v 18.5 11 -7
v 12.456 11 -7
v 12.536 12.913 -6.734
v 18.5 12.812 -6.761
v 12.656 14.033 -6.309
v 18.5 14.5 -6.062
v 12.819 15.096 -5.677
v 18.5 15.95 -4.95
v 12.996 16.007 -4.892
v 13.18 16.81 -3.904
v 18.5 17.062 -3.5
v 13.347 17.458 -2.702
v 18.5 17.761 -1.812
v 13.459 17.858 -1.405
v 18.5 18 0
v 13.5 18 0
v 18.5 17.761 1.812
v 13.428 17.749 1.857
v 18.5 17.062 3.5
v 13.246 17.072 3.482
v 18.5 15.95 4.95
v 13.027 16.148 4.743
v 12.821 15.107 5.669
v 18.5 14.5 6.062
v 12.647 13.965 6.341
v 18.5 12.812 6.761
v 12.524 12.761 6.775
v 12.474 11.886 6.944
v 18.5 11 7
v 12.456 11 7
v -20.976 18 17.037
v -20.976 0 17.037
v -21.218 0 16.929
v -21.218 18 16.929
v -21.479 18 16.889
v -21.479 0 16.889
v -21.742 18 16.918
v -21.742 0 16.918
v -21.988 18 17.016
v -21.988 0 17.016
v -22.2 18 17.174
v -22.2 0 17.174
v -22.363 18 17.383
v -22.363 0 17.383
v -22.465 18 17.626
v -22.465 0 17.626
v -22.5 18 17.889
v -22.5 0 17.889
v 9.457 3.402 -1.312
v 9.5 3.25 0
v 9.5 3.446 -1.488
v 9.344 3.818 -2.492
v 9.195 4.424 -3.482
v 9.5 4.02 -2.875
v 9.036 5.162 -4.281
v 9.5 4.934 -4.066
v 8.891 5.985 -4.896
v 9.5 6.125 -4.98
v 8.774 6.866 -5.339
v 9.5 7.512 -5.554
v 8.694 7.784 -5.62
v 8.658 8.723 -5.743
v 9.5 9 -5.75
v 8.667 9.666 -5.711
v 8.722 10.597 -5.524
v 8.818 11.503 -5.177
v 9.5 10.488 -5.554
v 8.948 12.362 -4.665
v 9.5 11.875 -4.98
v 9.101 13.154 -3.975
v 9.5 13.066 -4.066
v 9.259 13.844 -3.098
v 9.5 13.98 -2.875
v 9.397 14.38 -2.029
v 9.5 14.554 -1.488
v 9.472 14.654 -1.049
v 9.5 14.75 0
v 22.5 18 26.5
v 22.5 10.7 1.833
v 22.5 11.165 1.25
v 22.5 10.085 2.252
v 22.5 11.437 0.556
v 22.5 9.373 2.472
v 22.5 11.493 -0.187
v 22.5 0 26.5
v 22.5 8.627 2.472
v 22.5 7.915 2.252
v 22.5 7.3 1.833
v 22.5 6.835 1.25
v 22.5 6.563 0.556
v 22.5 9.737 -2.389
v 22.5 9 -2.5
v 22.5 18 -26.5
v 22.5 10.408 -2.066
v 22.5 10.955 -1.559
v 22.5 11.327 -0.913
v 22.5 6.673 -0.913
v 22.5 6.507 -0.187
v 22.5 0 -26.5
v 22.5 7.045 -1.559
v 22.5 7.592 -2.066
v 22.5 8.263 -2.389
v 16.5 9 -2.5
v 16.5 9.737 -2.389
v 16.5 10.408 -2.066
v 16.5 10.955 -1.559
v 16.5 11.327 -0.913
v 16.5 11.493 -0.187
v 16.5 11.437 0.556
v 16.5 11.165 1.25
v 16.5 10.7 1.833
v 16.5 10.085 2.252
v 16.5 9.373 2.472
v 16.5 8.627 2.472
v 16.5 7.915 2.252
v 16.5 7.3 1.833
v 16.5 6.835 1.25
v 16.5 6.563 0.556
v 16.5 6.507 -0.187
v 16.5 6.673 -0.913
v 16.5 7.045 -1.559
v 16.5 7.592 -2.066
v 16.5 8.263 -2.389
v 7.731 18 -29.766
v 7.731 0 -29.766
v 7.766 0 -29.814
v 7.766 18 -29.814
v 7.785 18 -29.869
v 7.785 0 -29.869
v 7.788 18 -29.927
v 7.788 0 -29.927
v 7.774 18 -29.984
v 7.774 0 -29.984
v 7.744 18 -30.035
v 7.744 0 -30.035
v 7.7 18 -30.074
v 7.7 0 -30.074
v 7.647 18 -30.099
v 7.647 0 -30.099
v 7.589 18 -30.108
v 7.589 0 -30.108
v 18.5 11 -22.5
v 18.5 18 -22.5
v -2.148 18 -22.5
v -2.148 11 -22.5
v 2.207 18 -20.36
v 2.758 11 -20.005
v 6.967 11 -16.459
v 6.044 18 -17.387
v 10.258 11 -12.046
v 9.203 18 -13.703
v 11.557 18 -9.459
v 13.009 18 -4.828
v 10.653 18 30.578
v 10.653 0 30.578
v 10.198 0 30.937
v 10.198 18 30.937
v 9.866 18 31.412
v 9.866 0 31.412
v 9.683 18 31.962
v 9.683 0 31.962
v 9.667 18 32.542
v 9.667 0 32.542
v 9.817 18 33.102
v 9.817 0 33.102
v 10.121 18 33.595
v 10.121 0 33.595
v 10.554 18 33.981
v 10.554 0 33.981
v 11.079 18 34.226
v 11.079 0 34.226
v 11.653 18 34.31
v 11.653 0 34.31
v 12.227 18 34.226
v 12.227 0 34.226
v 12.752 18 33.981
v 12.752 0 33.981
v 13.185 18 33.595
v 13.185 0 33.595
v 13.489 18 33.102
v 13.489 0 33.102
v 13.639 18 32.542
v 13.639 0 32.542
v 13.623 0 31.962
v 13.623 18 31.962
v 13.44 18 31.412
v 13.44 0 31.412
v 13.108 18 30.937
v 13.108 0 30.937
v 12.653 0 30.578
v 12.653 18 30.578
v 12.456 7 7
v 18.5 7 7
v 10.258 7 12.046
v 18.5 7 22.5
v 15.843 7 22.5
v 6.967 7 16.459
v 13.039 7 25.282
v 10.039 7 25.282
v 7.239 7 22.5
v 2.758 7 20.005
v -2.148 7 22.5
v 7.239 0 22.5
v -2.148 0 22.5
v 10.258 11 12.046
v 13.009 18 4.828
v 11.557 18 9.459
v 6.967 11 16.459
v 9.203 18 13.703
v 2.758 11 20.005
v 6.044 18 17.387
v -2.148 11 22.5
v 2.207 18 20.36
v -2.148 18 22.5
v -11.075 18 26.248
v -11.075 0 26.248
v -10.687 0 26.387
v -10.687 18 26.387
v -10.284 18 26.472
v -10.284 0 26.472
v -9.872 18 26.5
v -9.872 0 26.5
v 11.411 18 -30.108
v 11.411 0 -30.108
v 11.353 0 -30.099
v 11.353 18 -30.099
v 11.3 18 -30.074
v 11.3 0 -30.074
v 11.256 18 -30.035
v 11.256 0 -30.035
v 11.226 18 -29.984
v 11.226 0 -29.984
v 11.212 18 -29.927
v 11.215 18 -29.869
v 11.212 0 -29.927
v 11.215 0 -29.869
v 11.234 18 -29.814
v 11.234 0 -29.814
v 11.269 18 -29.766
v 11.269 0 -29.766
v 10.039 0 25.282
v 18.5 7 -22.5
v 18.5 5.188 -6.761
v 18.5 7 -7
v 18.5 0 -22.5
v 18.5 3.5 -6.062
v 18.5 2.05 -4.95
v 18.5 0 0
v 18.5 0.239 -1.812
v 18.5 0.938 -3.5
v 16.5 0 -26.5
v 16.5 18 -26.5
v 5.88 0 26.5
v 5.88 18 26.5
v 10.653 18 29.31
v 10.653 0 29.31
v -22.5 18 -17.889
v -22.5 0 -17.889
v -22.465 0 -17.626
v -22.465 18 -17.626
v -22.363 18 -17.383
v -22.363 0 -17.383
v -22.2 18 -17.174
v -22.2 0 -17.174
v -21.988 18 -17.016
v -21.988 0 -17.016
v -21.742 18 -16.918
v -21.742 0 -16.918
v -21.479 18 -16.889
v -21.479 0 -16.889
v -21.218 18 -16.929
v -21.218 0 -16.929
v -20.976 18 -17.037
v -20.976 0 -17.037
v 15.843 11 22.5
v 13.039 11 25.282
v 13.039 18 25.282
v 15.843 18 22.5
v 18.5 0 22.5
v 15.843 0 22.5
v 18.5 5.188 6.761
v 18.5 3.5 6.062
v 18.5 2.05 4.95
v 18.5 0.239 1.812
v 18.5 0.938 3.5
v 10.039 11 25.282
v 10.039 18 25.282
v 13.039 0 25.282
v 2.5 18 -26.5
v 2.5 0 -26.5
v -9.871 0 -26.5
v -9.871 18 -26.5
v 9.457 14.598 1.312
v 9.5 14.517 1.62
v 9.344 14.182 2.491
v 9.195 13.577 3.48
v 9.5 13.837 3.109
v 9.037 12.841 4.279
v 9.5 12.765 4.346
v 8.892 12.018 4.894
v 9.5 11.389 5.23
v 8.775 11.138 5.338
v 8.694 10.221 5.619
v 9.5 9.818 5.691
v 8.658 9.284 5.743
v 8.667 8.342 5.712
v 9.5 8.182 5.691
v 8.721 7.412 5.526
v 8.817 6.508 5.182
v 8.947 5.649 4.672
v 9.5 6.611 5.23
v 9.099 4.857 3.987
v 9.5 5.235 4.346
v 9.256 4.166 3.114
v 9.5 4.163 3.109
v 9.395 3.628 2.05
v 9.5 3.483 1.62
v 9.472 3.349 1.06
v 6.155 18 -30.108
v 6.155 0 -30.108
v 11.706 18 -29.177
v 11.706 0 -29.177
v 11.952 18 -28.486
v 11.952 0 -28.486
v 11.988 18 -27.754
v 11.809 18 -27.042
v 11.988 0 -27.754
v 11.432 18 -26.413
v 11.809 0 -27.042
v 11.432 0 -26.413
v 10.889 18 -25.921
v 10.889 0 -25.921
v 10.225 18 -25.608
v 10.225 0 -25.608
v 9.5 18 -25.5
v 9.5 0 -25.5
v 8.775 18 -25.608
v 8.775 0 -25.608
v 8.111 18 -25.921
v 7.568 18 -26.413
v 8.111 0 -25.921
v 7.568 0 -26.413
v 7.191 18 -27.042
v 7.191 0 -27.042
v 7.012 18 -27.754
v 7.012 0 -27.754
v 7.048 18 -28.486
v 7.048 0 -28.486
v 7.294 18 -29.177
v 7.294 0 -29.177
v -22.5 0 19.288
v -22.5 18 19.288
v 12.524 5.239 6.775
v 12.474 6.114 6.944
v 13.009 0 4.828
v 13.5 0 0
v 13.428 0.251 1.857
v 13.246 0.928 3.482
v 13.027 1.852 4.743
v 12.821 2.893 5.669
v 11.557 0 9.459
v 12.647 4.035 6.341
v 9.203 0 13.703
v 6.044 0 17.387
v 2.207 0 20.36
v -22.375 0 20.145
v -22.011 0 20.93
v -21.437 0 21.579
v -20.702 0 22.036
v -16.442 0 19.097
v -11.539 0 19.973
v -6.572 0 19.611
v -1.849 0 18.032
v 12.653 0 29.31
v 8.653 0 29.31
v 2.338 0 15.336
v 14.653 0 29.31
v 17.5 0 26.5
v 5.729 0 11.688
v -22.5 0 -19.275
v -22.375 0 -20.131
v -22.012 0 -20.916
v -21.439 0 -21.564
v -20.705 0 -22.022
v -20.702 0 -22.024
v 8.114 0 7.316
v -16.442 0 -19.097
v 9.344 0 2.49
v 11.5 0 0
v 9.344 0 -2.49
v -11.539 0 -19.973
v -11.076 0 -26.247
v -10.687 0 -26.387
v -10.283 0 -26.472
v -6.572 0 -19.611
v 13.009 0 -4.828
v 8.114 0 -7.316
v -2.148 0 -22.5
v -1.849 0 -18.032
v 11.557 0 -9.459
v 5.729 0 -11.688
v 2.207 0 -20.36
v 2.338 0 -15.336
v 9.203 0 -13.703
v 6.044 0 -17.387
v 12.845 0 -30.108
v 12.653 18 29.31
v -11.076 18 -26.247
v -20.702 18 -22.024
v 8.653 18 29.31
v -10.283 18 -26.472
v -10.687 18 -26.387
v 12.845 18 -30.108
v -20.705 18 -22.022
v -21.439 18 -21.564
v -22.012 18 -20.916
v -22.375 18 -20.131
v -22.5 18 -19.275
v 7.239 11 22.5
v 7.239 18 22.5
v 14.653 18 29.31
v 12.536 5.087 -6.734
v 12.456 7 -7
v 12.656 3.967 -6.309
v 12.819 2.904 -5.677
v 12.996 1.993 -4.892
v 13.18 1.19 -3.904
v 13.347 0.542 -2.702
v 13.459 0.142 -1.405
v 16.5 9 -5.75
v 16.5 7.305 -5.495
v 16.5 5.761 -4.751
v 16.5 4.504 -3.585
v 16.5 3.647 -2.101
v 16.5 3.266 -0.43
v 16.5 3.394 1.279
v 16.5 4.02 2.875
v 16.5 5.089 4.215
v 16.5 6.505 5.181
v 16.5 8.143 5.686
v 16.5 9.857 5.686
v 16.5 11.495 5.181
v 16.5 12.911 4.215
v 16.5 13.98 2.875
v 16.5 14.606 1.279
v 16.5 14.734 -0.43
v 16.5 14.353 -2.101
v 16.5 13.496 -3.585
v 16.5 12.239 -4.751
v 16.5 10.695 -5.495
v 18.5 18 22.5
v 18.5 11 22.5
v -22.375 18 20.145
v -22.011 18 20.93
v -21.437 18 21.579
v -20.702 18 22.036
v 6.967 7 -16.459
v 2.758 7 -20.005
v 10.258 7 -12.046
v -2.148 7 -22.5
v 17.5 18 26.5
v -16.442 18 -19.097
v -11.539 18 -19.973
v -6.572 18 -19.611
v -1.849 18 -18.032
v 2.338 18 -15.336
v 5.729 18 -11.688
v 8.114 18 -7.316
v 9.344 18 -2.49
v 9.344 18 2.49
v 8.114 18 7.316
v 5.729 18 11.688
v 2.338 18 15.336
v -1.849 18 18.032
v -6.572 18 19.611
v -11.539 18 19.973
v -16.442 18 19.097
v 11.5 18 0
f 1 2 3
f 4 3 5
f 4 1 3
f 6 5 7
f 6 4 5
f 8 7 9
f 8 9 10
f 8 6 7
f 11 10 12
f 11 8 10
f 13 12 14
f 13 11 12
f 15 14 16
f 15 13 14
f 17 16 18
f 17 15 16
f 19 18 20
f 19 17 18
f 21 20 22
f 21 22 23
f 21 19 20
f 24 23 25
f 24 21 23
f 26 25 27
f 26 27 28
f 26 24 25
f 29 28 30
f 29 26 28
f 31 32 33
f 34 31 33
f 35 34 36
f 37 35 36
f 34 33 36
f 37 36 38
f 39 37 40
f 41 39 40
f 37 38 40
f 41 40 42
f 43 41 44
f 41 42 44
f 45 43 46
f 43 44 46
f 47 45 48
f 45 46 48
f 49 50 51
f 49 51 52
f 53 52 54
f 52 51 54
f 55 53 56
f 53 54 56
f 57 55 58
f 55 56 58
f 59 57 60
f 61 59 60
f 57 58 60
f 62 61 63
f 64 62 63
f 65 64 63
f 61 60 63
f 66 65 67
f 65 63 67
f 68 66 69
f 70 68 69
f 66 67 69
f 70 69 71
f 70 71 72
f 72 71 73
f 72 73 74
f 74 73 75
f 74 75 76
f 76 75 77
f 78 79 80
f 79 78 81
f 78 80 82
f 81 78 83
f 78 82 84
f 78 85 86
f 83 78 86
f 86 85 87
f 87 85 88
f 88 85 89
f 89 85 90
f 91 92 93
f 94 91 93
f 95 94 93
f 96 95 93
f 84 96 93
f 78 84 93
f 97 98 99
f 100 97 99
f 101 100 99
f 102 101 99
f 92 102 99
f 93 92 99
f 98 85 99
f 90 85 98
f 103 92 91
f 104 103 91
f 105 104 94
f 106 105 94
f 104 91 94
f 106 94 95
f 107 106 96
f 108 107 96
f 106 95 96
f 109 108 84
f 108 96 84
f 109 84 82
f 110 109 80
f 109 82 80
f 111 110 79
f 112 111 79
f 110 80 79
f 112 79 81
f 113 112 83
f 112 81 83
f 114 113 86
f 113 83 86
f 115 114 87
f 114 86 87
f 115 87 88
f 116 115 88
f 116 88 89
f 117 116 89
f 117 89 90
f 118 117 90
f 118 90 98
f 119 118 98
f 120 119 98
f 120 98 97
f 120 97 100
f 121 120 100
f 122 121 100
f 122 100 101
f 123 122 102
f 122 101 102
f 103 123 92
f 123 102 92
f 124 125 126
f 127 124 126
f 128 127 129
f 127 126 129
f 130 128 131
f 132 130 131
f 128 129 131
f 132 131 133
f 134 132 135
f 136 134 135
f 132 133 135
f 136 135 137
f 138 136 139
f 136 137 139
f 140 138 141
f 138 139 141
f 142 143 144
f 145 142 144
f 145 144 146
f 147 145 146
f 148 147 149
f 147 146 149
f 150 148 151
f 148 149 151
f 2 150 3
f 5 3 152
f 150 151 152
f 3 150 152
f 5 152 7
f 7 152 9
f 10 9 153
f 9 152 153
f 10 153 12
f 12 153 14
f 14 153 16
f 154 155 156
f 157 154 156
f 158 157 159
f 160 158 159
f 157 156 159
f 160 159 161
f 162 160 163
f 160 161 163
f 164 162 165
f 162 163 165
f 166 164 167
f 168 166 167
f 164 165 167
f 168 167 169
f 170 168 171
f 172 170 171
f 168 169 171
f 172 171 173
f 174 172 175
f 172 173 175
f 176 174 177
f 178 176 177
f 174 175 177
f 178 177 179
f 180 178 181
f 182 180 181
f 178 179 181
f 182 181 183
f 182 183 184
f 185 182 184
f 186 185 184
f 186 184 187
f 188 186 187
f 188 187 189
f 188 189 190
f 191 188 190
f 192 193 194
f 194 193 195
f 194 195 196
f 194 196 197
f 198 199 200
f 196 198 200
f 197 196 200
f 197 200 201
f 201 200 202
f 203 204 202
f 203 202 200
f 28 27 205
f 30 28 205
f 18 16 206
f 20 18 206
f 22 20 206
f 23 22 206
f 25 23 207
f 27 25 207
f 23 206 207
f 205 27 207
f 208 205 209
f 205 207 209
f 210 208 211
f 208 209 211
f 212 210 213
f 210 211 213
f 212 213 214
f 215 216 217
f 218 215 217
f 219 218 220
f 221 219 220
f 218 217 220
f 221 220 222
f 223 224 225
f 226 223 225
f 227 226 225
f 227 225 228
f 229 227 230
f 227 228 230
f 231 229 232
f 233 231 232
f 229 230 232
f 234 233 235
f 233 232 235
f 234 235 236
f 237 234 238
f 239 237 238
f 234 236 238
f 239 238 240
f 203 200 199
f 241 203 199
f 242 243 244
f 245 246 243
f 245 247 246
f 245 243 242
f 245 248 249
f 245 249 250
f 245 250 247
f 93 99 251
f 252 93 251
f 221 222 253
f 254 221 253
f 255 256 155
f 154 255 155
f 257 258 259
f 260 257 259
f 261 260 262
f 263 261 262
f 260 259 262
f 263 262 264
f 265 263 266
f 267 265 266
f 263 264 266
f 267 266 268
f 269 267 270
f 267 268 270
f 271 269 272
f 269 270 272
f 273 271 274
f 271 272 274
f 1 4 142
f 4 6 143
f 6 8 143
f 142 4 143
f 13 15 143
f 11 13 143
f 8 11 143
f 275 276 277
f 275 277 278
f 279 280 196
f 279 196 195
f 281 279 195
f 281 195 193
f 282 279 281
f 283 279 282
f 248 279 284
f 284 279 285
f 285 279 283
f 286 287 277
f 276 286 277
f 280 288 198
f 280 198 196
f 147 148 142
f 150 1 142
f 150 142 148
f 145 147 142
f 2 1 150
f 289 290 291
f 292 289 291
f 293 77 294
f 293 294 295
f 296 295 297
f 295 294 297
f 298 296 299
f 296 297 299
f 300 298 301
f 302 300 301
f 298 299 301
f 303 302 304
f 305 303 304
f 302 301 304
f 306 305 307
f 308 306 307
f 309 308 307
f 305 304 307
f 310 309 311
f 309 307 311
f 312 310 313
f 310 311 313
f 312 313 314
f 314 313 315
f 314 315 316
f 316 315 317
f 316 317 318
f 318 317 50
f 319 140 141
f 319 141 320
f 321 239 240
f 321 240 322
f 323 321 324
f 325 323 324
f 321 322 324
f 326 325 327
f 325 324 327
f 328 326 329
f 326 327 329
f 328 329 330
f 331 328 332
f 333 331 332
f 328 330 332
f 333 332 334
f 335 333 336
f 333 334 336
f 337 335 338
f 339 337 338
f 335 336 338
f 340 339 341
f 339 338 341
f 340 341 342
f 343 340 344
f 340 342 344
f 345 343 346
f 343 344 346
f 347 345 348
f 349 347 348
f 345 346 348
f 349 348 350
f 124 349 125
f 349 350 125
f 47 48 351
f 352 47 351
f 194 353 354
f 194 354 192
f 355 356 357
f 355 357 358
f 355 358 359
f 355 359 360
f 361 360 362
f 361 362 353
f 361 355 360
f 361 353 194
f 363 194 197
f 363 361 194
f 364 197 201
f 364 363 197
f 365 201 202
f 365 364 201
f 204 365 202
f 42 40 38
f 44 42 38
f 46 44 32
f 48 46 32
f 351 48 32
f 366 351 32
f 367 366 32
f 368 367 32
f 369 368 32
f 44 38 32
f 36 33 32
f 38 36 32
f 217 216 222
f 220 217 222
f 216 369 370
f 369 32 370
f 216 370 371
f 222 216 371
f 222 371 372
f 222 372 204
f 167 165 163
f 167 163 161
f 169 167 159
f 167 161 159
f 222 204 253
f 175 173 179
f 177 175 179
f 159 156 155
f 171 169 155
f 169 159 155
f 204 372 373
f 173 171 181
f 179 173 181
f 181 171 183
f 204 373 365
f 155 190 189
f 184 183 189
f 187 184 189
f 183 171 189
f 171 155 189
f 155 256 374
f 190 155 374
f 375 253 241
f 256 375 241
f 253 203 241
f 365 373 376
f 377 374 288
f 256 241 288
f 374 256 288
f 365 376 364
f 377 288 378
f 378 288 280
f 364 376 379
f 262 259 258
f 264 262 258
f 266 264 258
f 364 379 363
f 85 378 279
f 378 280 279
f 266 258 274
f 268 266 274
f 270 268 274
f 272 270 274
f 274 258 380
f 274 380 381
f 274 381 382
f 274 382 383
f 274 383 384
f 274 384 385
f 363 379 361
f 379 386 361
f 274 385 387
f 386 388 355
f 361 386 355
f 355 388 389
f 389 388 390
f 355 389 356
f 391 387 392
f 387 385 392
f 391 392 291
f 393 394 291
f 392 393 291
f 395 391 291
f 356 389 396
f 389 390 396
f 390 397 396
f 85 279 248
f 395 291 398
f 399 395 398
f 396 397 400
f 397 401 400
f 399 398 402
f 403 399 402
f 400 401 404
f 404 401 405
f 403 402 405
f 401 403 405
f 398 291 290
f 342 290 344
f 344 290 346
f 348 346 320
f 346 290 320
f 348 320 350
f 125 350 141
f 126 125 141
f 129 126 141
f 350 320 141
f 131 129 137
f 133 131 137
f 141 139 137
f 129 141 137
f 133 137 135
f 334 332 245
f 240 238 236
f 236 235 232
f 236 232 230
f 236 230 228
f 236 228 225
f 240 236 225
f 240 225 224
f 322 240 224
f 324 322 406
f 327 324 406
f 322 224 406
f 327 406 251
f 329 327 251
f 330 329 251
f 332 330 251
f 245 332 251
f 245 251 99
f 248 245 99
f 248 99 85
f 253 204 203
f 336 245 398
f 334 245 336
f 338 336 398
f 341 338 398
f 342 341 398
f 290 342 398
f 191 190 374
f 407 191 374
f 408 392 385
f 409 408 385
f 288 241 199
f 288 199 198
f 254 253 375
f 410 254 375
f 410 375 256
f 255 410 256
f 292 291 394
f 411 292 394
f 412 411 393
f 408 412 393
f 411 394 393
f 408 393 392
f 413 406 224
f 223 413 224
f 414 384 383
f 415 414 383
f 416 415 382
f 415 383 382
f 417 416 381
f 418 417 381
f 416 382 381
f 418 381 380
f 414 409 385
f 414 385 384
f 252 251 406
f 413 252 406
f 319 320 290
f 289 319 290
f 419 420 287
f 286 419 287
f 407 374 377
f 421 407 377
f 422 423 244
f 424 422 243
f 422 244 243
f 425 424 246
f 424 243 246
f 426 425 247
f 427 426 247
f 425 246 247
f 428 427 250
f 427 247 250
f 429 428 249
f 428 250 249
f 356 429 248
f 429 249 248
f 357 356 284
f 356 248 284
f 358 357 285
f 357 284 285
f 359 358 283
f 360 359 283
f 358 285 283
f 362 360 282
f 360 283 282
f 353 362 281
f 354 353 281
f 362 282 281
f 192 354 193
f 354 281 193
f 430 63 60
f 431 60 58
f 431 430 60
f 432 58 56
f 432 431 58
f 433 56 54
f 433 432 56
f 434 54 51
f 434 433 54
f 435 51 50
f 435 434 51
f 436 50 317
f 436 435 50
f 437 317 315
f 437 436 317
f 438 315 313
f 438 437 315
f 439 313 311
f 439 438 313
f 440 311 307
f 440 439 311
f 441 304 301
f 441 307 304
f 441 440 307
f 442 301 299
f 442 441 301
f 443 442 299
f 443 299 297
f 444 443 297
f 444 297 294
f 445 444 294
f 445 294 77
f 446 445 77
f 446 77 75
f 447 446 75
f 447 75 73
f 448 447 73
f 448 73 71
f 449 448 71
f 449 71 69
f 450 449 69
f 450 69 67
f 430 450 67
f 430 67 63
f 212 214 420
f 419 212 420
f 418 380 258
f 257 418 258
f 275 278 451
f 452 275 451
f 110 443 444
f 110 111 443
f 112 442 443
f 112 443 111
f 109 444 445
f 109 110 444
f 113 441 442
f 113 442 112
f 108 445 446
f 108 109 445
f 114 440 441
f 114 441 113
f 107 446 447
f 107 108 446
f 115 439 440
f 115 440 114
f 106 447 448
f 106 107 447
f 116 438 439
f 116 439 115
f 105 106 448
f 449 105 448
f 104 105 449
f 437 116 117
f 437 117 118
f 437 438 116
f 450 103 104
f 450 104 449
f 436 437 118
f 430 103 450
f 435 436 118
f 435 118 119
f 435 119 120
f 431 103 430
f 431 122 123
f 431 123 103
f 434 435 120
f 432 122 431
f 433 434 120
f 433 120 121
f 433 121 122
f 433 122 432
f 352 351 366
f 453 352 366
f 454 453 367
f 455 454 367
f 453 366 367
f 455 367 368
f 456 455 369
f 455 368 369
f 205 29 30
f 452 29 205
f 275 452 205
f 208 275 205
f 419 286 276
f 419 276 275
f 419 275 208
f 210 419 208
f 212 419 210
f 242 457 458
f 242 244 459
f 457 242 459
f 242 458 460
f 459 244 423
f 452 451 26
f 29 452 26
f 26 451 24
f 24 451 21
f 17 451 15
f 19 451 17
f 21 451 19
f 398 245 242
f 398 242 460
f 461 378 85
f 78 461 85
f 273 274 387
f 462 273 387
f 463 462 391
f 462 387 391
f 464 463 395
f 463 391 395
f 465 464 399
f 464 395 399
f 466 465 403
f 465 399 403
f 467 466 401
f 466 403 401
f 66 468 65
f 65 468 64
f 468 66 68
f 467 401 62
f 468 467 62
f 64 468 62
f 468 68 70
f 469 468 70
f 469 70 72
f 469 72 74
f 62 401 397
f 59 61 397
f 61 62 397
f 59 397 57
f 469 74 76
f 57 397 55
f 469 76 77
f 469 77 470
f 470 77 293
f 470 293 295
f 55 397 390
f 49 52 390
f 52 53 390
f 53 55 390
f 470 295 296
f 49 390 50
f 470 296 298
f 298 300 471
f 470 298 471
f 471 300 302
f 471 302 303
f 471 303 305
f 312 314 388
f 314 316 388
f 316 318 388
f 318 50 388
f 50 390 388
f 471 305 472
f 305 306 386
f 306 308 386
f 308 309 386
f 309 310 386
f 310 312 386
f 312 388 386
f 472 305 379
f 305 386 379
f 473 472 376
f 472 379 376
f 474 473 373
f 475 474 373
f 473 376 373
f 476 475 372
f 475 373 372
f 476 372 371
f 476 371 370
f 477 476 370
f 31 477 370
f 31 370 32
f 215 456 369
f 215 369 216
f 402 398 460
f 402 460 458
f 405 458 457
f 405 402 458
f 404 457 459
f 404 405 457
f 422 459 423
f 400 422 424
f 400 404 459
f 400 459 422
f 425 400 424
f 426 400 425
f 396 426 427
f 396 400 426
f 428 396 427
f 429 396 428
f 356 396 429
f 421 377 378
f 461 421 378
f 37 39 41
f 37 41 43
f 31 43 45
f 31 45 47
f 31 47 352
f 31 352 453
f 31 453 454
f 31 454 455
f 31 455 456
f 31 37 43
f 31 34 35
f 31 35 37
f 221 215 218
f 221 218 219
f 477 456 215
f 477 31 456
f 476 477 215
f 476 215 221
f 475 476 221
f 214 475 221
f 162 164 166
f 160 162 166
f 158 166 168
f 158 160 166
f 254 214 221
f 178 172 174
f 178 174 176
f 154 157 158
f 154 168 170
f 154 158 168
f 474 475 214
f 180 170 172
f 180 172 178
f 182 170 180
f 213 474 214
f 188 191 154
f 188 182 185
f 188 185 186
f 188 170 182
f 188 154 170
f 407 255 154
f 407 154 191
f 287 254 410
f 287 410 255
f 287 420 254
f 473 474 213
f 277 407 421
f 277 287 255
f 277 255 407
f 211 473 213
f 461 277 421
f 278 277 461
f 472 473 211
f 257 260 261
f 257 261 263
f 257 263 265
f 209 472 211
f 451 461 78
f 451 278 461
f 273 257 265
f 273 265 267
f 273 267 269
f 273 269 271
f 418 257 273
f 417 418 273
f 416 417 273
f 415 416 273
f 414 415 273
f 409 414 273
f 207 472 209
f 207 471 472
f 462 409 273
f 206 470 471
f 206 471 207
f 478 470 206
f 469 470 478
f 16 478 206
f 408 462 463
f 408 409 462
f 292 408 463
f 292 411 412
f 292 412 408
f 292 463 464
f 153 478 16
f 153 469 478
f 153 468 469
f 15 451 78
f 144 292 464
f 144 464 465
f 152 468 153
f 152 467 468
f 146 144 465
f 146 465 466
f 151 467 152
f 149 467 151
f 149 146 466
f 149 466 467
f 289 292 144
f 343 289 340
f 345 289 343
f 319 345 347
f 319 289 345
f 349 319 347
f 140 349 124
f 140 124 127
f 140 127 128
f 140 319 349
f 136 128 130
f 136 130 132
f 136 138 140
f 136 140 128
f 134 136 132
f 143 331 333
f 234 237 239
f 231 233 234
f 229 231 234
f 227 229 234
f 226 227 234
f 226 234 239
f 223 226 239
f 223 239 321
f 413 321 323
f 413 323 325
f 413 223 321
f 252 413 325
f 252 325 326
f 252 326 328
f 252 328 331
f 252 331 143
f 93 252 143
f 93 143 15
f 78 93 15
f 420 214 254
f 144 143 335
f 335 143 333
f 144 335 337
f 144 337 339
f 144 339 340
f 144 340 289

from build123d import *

# Parameters (mm, degrees)
BOSS_EXTRUDE1_DEPTH = 18
CUT_EXTRUDE1_DEPTH  = 7
BOSS_EXTRUDE2_DEPTH = 7
SKETCH4_R           = 2.5
CUT_EXTRUDE2_DEPTH  = 6
SKETCH5_R           = 5.75
CUT_EXTRUDE3_DEPTH  = 7
CUT_EXTRUDE4_START  = -7
SKETCH6_R           = 5.75
CUT_EXTRUDE4_DEPTH  = 7


with BuildPart() as part:
    # Sketch1 → Boss-Extrude1 (new body)
    with BuildSketch(Plane(origin=(0, 0, 0), x_dir=(1, 0, 0), z_dir=(0, 1, 0))):
        with BuildLine():
            Line((10.653013329, -29.309744988), (10.653013329, -30.57769418))
            ThreePointArc((10.653013329, -30.57769418), (11.653013329, -34.309744988), (12.653013329, -30.57769418))
            Line((12.653013329, -30.57769418), (12.653013329, -29.309744988))
            Line((12.653013329, -29.309744988), (14.653013329, -29.309744988))
            Line((14.653013329, -29.309744988), (17.5, -26.5))
            Line((17.5, -26.5), (22.5, -26.5))
            Line((22.5, -26.5), (22.5, 26.5))
            Line((22.5, 26.5), (16.5, 26.5))
            Line((16.5, 26.5), (12.844502727, 30.107679392))
            Line((12.844502727, 30.107679392), (11.410696035, 30.107679392))
            ThreePointArc((11.410696035, 30.107679392), (11.225950376, 29.984289062), (11.269162996, 29.766369807))
            ThreePointArc((11.269162996, 29.766369807), (9.5, 25.5), (7.730837004, 29.766369807))
            ThreePointArc((7.730837004, 29.766369807), (7.774049624, 29.984289062), (7.589303965, 30.107679392))
            Line((7.589303965, 30.107679392), (6.155497273, 30.107679392))
            Line((6.155497273, 30.107679392), (2.5, 26.5))
            Line((2.5, 26.5), (-9.870833143, 26.5))
            ThreePointArc((-9.870833143, 26.5), (-10.486603861, 26.436124388), (-11.076152757, 26.247217616))
            Line((-11.076152757, 26.247217616), (-20.702456422, 22.023754373))
            Line((-20.702456422, 22.023754373), (-20.705319614, 22.022498171))
            ThreePointArc((-20.705319614, 22.022498171), (-22.011569115, 20.916018371), (-22.5, 19.275280555))
            Line((-22.5, 19.275280555), (-22.5, 17.88854382))
            ThreePointArc((-22.5, 17.88854382), (-21.987950036, 17.015672259), (-20.976190476, 17.0367084))
            ThreePointArc((-20.976190476, 17.0367084), (9.5, 0), (-20.976190476, -17.0367084))
            ThreePointArc((-20.976190476, -17.0367084), (-21.987950036, -17.015672259), (-22.5, -17.88854382))
            Line((-22.5, -17.88854382), (-22.5, -19.287953276))
            ThreePointArc((-22.5, -19.287953276), (-22.010713993, -20.929999331), (-20.702456502, -22.03642528))
            Line((-20.702456502, -22.03642528), (-11.074921132, -26.248472005))
            ThreePointArc((-11.074921132, -26.248472005), (-10.486705619, -26.43644479), (-9.87246463, -26.5))
            Line((-9.87246463, -26.5), (5.880022863, -26.5))
            Line((5.880022863, -26.5), (8.653013329, -29.309744988))
            Line((8.653013329, -29.309744988), (10.653013329, -29.309744988))
        make_face()
    extrude(amount=BOSS_EXTRUDE1_DEPTH)

    # Sketch2 → Cut-Extrude1 (cut)
    with BuildSketch(Plane.XZ):
        with BuildLine():
            Line((18.5, 22.5), (18.5, -22.5))
            Line((18.5, -22.5), (-2.148353456, -22.5))
            ThreePointArc((-2.148353456, -22.5), (13.5, 0), (-2.148353456, 22.5))
            Line((-2.148353456, 22.5), (7.238559187, 22.5))
            Line((7.238559187, 22.5), (10.039345887, 25.282038261))
            Line((10.039345887, 25.282038261), (13.039345883, 25.282178795))
            Line((13.039345883, 25.282178795), (15.843268341, 22.5))
            Line((15.843268341, 22.5), (18.5, 22.5))
        make_face()
    cut_extrude1 = extrude(amount=-CUT_EXTRUDE1_DEPTH, mode=Mode.SUBTRACT)

    # Mirror1: Cut-Extrude1 across plane
    add(cut_extrude1.mirror(Plane(origin=(0, 9, 0), x_dir=(0, 0, 1), z_dir=(0, -1, 0))), mode=Mode.SUBTRACT)

    # Sketch3 → Boss-Extrude2 (add)
    with BuildSketch(Plane.ZY.offset(-18.5)):
        with BuildLine():
            Line((7, 7), (-7, 7))
            ThreePointArc((-7, 7), (0, 0), (7, 7))
        make_face()
    boss_extrude2 = extrude(amount=BOSS_EXTRUDE2_DEPTH)

    # Mirror2: Boss-Extrude2 across plane
    add(boss_extrude2.mirror(Plane(origin=(0, 9, 0), x_dir=(0, 0, 1), z_dir=(0, -1, 0))))

    # Sketch4 → Cut-Extrude2 (cut)
    with BuildSketch(Plane(origin=(22.5, 0, 0), x_dir=(0, 0, -1), z_dir=(1, 0, 0))):
        with Locations((0, 9)):
            Circle(SKETCH4_R)
    extrude(amount=-CUT_EXTRUDE2_DEPTH, mode=Mode.SUBTRACT)

    # Sketch5 → Cut-Extrude3 (cut)
    with BuildSketch(Plane(origin=(9.5, 0, 0), x_dir=(0, 0, -1), z_dir=(1, 0, 0))):
        with Locations((0, 9)):
            Circle(SKETCH5_R)
    extrude(amount=-CUT_EXTRUDE3_DEPTH, mode=Mode.SUBTRACT)

    # Sketch6 → Cut-Extrude4 (cut)
    with BuildSketch(Plane.ZY.offset(-9.5).offset(CUT_EXTRUDE4_START)):
        with Locations(Location((0, 9, 0), (0, 0, 180))):
            Circle(SKETCH6_R)
    extrude(amount=CUT_EXTRUDE4_DEPTH, mode=Mode.SUBTRACT)


solid = part.part
